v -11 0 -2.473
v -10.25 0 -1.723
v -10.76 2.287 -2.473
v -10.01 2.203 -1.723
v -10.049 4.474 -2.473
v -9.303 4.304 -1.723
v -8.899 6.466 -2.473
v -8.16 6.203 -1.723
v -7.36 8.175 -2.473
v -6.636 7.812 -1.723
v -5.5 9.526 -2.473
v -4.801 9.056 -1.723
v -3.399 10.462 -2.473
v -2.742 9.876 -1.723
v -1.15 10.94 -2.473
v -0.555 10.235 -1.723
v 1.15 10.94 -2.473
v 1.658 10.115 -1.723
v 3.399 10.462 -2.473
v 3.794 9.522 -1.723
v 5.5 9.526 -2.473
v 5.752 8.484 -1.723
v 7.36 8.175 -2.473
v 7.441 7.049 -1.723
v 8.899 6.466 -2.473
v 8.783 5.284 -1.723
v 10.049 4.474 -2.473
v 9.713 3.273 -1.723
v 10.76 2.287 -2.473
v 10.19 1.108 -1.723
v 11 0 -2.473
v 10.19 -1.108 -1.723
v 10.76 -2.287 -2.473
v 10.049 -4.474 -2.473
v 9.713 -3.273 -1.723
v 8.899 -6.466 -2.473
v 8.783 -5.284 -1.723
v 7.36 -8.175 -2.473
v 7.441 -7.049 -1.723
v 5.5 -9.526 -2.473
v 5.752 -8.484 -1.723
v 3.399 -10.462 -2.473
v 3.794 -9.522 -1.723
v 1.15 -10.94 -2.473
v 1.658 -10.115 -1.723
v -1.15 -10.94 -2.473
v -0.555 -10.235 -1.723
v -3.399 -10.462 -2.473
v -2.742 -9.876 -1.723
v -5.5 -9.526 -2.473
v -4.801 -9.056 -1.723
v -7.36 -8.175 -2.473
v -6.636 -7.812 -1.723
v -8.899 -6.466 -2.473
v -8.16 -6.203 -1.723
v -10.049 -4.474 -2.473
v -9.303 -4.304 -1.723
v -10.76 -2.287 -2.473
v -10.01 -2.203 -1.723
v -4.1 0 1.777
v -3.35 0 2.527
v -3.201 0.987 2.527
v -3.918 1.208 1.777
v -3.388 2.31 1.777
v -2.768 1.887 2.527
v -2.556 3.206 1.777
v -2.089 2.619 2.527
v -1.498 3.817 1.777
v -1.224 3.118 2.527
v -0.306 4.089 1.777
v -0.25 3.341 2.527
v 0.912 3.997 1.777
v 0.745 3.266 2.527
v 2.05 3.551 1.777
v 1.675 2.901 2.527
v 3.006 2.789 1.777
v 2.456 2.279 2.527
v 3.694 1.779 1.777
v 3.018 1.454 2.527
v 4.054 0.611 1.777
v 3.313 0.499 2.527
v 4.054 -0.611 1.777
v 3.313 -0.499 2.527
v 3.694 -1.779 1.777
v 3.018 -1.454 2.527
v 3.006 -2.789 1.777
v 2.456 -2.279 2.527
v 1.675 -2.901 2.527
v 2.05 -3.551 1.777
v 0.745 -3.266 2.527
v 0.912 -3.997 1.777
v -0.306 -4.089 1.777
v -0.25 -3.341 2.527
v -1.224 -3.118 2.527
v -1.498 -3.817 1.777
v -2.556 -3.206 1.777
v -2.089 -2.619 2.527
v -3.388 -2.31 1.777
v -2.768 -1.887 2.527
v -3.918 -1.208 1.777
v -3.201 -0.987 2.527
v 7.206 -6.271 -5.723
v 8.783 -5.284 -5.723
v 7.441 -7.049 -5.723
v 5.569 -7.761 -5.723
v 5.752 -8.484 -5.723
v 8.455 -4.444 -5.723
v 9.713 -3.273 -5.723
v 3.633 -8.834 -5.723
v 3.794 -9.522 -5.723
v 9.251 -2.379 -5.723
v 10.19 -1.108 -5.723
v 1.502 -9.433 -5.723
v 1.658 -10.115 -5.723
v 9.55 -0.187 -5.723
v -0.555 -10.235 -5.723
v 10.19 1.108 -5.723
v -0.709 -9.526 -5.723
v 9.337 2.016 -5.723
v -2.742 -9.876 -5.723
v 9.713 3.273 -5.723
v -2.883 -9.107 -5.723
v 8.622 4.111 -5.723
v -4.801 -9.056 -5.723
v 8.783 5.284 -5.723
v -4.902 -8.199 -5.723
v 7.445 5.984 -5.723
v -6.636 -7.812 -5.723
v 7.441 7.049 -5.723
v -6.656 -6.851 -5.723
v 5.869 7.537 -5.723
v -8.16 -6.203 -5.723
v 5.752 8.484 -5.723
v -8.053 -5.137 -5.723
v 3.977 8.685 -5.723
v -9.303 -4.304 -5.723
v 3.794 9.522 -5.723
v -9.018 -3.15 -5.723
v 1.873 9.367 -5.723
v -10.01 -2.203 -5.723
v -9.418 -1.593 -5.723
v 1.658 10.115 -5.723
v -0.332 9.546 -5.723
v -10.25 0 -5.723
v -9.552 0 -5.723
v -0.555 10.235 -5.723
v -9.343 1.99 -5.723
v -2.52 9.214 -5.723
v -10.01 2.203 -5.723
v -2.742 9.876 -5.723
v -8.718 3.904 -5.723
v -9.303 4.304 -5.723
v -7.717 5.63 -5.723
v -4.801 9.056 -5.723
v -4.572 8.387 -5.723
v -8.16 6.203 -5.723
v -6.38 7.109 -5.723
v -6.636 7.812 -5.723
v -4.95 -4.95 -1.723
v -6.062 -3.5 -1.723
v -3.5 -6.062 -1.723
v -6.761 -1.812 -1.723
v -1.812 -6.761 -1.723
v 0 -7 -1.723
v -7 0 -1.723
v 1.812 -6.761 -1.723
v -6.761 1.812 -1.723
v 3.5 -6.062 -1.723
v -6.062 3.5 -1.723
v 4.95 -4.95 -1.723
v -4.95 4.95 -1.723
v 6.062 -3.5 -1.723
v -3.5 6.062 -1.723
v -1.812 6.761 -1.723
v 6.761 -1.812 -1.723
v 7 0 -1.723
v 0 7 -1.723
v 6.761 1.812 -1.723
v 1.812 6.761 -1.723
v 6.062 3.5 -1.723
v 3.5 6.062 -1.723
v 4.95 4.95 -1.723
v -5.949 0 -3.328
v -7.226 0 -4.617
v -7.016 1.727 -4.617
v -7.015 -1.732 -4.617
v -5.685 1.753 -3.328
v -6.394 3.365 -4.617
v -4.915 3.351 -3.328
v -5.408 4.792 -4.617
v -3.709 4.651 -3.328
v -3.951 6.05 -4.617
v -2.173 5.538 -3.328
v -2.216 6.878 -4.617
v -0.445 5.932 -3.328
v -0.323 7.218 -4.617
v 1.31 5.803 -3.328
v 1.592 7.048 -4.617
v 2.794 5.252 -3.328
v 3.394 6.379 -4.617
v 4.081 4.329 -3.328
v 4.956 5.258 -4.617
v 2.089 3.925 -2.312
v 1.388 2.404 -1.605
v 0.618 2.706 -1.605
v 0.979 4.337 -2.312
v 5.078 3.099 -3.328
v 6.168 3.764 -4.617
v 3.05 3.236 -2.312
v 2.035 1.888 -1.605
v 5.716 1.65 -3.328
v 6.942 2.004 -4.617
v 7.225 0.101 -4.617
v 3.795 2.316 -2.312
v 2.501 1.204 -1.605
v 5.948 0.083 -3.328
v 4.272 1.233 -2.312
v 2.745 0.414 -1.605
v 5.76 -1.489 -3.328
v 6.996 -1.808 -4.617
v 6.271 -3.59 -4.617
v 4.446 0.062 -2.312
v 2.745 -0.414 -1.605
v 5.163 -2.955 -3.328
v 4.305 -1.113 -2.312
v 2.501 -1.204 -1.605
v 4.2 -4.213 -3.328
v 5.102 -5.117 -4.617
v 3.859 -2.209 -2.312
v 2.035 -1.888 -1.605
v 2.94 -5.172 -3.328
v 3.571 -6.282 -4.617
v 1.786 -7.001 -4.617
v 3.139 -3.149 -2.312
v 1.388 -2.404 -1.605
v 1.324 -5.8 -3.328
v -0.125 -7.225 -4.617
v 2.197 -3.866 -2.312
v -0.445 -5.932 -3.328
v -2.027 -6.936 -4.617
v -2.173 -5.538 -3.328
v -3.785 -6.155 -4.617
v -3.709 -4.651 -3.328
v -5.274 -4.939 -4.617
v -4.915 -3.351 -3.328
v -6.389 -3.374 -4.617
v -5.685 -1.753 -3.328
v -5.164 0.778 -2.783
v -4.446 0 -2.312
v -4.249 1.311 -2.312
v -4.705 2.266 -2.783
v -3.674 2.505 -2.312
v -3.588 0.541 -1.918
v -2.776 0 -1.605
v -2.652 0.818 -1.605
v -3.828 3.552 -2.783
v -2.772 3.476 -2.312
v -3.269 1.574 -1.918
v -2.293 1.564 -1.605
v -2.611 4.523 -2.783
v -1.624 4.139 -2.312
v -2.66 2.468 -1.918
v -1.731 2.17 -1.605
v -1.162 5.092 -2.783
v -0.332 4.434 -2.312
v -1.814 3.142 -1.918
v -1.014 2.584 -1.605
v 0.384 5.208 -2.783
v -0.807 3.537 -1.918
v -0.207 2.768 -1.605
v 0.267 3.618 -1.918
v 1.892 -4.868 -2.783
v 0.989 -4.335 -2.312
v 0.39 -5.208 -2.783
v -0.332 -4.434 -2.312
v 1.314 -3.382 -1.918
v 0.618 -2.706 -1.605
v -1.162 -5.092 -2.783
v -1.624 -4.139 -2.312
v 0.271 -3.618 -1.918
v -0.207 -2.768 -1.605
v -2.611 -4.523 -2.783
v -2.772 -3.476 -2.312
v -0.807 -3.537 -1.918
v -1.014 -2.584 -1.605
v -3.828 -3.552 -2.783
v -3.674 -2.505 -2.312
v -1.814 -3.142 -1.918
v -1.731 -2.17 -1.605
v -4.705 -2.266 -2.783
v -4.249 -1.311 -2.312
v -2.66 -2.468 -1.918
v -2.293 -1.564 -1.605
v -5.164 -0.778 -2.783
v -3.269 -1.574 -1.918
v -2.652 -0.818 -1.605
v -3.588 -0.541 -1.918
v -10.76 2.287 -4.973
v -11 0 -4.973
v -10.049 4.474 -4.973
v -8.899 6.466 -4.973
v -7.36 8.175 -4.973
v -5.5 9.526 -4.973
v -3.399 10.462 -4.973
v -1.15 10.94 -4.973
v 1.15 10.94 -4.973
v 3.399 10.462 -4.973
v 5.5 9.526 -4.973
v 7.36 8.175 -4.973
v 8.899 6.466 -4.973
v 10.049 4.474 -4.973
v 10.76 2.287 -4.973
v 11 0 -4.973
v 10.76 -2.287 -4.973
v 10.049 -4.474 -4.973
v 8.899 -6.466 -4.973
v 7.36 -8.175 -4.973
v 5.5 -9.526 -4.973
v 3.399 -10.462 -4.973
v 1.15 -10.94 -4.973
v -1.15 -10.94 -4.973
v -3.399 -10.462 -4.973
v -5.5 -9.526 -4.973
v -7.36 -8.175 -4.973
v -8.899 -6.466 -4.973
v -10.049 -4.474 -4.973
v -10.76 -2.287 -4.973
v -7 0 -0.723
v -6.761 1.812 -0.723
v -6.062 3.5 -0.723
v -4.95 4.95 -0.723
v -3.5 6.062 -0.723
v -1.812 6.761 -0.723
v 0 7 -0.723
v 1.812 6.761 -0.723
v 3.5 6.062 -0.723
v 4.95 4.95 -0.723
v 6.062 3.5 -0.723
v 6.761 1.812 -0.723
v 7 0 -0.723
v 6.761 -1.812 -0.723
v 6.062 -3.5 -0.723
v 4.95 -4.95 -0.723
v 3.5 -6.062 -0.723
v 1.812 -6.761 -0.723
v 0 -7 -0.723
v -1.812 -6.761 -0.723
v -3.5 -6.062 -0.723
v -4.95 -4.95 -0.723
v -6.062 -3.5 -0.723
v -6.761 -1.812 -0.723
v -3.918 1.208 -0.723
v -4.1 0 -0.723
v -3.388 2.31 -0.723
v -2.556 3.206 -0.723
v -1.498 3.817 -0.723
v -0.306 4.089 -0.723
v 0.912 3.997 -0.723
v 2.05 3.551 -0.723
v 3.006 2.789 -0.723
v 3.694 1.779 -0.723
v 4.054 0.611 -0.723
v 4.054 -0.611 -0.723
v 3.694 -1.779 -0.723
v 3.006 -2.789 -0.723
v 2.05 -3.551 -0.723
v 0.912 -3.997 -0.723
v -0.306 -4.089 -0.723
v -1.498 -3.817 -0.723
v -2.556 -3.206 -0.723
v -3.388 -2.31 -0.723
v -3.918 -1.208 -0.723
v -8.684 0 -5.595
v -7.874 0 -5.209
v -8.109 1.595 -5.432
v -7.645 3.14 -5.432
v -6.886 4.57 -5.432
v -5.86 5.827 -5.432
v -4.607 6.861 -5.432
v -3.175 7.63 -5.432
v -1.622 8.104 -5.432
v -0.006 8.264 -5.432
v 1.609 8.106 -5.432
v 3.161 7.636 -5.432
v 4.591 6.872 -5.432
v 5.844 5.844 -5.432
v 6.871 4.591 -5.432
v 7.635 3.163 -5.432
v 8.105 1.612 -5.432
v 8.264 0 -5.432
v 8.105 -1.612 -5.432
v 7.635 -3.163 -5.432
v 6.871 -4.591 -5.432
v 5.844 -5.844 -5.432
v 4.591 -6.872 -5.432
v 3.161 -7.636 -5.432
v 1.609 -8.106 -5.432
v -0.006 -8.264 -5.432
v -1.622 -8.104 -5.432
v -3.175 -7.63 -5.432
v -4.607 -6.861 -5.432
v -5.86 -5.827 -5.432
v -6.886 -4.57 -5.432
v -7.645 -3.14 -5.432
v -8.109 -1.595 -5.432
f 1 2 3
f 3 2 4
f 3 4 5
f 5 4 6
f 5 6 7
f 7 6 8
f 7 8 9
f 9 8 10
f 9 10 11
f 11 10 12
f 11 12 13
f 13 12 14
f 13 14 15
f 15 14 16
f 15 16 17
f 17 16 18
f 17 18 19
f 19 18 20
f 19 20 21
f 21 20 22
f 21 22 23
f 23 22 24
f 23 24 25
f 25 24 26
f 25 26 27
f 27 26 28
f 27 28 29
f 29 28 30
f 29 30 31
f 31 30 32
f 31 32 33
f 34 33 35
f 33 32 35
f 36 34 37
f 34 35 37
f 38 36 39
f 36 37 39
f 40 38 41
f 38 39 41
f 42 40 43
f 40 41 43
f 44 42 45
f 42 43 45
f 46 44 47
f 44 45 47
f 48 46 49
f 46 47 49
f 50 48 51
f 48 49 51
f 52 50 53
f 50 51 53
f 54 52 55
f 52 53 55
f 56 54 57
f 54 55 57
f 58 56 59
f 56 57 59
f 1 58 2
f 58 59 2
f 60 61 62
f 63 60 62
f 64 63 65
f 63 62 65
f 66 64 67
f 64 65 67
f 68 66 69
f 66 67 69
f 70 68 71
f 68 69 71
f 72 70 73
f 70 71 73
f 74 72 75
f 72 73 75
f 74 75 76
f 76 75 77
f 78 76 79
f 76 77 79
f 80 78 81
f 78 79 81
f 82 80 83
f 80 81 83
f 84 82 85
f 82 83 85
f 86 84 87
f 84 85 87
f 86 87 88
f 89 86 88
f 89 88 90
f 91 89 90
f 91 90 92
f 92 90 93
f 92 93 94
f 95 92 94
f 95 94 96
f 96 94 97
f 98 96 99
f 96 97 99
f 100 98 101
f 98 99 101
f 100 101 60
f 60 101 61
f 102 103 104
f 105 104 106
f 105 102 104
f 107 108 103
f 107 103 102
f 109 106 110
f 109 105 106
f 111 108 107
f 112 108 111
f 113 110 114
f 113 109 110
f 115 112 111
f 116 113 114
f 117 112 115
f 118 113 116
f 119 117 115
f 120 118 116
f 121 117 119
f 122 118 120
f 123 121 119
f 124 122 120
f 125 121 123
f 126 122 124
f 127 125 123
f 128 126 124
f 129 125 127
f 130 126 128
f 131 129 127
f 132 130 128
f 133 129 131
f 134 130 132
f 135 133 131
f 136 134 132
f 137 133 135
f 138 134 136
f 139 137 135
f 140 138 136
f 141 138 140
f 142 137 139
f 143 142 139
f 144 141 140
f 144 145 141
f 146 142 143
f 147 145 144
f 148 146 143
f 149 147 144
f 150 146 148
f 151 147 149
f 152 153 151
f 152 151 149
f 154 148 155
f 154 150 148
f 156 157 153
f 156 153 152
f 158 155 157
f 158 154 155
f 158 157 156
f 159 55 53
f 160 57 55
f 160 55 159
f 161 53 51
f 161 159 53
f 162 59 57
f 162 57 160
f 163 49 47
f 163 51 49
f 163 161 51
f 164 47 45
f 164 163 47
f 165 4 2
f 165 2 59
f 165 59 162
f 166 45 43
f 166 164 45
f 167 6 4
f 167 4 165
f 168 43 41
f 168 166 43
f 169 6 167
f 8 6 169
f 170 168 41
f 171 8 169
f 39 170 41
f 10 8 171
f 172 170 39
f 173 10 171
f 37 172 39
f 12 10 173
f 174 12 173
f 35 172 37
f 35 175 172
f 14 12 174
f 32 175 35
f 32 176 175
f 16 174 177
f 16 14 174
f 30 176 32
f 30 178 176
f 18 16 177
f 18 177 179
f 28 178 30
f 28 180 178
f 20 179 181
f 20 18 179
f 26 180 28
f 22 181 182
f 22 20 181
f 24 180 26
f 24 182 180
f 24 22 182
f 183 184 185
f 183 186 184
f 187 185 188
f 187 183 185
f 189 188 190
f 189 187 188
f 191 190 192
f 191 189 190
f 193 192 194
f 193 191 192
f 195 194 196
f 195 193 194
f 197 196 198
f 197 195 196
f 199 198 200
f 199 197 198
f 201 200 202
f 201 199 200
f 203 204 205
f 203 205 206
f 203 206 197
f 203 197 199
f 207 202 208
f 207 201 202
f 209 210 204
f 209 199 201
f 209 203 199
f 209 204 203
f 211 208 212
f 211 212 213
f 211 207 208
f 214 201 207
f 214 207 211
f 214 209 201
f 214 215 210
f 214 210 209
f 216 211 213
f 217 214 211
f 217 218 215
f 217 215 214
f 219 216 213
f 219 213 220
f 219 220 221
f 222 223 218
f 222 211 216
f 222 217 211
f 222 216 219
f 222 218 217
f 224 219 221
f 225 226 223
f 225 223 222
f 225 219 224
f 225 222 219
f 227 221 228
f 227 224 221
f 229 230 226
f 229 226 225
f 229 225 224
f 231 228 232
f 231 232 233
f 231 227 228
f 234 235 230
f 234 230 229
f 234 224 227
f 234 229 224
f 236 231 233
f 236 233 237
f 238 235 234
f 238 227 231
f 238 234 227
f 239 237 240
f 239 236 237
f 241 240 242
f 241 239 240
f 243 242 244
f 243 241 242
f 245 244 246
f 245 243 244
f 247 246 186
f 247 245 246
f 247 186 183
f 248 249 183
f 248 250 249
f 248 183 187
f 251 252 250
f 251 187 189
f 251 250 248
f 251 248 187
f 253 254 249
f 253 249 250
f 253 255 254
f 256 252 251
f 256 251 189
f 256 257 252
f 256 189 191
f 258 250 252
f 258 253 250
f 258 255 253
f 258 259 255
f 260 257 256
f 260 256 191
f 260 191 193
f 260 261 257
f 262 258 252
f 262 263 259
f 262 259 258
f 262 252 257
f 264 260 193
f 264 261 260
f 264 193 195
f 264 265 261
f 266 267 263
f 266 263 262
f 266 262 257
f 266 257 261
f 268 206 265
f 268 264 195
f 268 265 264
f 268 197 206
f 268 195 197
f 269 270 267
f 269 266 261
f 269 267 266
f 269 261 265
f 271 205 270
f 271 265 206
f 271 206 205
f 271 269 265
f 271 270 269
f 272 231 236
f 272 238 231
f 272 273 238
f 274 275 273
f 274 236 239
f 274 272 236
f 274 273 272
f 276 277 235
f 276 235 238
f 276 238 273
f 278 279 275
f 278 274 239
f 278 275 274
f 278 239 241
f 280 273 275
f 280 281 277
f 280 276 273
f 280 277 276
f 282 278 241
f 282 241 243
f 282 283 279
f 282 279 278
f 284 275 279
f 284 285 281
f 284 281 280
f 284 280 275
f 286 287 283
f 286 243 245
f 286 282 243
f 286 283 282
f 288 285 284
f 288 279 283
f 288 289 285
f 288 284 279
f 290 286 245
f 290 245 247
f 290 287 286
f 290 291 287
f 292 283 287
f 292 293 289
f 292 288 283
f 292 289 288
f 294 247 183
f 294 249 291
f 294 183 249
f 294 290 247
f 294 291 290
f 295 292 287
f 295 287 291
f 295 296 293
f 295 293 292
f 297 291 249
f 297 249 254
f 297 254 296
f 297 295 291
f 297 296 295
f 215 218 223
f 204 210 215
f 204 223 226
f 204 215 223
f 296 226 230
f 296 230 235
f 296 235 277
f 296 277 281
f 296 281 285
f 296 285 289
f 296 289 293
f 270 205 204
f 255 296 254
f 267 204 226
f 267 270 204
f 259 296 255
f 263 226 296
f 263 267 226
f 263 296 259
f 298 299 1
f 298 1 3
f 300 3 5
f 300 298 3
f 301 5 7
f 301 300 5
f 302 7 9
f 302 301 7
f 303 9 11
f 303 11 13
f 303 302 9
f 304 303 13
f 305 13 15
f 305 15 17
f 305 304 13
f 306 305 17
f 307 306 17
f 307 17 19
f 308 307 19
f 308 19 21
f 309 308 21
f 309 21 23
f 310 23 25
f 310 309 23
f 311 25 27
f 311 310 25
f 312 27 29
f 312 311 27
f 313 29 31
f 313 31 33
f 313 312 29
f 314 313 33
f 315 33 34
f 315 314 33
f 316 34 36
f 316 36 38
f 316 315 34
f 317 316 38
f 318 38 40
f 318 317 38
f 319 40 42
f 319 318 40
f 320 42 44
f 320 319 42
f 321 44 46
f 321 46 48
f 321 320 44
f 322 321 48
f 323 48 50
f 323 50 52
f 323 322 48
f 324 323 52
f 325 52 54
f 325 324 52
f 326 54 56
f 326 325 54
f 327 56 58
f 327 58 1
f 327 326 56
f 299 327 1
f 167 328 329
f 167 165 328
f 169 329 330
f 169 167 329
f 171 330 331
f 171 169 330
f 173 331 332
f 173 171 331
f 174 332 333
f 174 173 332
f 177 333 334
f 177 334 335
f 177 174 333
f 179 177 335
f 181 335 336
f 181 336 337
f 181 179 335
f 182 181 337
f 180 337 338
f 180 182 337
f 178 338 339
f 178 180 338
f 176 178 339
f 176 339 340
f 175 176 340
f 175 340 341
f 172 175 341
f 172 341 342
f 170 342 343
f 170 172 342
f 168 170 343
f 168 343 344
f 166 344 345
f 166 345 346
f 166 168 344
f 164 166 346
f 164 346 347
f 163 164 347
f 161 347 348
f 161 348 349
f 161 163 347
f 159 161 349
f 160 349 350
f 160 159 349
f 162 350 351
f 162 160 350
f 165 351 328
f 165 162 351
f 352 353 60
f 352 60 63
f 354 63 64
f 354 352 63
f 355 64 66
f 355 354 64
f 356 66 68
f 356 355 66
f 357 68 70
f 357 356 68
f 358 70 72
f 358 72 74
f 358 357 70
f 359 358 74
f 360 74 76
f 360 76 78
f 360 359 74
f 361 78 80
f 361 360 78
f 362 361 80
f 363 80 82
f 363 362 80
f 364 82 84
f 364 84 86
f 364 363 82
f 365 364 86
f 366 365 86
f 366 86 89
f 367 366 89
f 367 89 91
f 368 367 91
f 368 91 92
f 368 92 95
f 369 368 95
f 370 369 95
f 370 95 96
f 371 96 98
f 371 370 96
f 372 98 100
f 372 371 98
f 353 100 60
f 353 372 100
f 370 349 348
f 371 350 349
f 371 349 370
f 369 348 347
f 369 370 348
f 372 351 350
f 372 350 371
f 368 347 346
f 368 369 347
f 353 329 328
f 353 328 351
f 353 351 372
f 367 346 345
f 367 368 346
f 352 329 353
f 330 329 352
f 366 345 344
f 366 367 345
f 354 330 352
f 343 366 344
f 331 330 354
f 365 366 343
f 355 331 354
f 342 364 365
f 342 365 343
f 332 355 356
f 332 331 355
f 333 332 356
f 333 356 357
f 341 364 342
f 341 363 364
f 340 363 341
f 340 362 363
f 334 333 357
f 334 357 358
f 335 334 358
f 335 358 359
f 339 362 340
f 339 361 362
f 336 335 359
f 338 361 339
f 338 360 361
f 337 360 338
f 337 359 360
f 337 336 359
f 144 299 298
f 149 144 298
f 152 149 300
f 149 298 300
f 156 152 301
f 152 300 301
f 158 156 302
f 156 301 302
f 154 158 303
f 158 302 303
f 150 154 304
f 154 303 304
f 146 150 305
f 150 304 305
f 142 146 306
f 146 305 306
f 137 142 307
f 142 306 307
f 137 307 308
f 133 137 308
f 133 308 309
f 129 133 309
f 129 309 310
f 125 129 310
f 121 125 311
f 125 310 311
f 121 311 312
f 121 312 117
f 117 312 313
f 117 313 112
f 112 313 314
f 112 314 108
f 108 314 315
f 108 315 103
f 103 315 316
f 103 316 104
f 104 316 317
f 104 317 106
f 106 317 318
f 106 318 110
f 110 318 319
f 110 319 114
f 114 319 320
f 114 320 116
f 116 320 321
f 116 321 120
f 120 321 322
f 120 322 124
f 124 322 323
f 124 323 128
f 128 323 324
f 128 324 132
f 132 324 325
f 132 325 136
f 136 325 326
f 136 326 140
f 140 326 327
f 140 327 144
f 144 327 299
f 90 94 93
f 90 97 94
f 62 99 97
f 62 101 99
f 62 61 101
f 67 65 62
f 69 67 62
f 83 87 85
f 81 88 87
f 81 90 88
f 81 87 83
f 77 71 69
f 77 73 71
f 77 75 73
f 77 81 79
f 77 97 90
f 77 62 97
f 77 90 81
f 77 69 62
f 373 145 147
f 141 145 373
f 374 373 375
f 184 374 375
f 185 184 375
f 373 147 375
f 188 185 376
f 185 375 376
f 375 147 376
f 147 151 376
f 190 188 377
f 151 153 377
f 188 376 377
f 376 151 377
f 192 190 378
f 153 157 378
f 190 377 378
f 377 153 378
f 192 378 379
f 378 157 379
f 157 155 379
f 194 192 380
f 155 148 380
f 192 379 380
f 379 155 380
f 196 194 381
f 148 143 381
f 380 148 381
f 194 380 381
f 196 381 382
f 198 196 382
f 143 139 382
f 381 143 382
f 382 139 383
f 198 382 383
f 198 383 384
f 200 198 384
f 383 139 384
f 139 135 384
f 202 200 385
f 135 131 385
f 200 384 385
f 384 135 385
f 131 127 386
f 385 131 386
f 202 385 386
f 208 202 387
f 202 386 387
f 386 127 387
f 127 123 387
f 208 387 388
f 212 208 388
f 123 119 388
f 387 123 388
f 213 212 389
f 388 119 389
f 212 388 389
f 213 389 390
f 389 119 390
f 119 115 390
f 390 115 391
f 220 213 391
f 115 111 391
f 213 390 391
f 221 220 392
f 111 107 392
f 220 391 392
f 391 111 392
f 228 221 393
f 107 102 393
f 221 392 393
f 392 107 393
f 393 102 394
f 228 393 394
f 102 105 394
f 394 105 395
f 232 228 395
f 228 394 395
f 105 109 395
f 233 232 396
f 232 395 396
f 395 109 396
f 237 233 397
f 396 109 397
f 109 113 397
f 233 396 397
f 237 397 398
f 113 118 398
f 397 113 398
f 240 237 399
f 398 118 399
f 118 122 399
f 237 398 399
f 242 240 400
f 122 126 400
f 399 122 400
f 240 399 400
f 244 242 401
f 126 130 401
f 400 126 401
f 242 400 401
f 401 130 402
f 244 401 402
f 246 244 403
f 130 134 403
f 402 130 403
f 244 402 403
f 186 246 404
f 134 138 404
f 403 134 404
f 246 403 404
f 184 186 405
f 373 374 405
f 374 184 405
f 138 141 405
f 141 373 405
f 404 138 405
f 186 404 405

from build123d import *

# Parameters (mm, degrees)
F2_R    = 3
F3_SIZE = 0.75
F4_SIZE = 0.75


with BuildPart() as f1:
    # F0 (on Front) → F1 (revolve)
    with BuildSketch(Plane.XZ):
        with BuildLine():
            Line((-11, -1.722947), (-11, -5.722947))
            Line((-11, -5.722947), (-8, -5.722947))
            ThreePointArc((-8, -5.722947), (-5.767763, -3.181992), (-2.775571, -1.605249))
            Line((-2.775571, -1.605249), (0, -1.605249))
            Line((0, -1.605249), (0, 2.527053))
            Line((0, 2.527053), (-4.1, 2.527053))
            Line((-4.1, 2.527053), (-4.1, -0.722947))
            Line((-4.1, -0.722947), (-7, -0.722947))
            Line((-7, -0.722947), (-7, -1.722947))
            Line((-7, -1.722947), (-11, -1.722947))
        make_face()
    revolve(axis=Axis((0, 0, -0.8276), (0, 0, -1)))

    # F2
    f2_edges = [f1.edges().sort_by_distance(p)[0] for p in [
        (8, 0, -5.722947),
    ]]
    fillet(f2_edges, radius=F2_R)

    # F3
    f3_edges = [f1.edges().sort_by_distance(p)[0] for p in [
        (11, 0, -5.722947),
        (11, 0, -1.722947),
    ]]
    chamfer(f3_edges, length=F3_SIZE)

    # F4
    f4_edges = [f1.edges().sort_by_distance(p)[0] for p in [
        (4.1, 0, 2.527053),
    ]]
    chamfer(f4_edges, length=F4_SIZE)


solid = f1.part
